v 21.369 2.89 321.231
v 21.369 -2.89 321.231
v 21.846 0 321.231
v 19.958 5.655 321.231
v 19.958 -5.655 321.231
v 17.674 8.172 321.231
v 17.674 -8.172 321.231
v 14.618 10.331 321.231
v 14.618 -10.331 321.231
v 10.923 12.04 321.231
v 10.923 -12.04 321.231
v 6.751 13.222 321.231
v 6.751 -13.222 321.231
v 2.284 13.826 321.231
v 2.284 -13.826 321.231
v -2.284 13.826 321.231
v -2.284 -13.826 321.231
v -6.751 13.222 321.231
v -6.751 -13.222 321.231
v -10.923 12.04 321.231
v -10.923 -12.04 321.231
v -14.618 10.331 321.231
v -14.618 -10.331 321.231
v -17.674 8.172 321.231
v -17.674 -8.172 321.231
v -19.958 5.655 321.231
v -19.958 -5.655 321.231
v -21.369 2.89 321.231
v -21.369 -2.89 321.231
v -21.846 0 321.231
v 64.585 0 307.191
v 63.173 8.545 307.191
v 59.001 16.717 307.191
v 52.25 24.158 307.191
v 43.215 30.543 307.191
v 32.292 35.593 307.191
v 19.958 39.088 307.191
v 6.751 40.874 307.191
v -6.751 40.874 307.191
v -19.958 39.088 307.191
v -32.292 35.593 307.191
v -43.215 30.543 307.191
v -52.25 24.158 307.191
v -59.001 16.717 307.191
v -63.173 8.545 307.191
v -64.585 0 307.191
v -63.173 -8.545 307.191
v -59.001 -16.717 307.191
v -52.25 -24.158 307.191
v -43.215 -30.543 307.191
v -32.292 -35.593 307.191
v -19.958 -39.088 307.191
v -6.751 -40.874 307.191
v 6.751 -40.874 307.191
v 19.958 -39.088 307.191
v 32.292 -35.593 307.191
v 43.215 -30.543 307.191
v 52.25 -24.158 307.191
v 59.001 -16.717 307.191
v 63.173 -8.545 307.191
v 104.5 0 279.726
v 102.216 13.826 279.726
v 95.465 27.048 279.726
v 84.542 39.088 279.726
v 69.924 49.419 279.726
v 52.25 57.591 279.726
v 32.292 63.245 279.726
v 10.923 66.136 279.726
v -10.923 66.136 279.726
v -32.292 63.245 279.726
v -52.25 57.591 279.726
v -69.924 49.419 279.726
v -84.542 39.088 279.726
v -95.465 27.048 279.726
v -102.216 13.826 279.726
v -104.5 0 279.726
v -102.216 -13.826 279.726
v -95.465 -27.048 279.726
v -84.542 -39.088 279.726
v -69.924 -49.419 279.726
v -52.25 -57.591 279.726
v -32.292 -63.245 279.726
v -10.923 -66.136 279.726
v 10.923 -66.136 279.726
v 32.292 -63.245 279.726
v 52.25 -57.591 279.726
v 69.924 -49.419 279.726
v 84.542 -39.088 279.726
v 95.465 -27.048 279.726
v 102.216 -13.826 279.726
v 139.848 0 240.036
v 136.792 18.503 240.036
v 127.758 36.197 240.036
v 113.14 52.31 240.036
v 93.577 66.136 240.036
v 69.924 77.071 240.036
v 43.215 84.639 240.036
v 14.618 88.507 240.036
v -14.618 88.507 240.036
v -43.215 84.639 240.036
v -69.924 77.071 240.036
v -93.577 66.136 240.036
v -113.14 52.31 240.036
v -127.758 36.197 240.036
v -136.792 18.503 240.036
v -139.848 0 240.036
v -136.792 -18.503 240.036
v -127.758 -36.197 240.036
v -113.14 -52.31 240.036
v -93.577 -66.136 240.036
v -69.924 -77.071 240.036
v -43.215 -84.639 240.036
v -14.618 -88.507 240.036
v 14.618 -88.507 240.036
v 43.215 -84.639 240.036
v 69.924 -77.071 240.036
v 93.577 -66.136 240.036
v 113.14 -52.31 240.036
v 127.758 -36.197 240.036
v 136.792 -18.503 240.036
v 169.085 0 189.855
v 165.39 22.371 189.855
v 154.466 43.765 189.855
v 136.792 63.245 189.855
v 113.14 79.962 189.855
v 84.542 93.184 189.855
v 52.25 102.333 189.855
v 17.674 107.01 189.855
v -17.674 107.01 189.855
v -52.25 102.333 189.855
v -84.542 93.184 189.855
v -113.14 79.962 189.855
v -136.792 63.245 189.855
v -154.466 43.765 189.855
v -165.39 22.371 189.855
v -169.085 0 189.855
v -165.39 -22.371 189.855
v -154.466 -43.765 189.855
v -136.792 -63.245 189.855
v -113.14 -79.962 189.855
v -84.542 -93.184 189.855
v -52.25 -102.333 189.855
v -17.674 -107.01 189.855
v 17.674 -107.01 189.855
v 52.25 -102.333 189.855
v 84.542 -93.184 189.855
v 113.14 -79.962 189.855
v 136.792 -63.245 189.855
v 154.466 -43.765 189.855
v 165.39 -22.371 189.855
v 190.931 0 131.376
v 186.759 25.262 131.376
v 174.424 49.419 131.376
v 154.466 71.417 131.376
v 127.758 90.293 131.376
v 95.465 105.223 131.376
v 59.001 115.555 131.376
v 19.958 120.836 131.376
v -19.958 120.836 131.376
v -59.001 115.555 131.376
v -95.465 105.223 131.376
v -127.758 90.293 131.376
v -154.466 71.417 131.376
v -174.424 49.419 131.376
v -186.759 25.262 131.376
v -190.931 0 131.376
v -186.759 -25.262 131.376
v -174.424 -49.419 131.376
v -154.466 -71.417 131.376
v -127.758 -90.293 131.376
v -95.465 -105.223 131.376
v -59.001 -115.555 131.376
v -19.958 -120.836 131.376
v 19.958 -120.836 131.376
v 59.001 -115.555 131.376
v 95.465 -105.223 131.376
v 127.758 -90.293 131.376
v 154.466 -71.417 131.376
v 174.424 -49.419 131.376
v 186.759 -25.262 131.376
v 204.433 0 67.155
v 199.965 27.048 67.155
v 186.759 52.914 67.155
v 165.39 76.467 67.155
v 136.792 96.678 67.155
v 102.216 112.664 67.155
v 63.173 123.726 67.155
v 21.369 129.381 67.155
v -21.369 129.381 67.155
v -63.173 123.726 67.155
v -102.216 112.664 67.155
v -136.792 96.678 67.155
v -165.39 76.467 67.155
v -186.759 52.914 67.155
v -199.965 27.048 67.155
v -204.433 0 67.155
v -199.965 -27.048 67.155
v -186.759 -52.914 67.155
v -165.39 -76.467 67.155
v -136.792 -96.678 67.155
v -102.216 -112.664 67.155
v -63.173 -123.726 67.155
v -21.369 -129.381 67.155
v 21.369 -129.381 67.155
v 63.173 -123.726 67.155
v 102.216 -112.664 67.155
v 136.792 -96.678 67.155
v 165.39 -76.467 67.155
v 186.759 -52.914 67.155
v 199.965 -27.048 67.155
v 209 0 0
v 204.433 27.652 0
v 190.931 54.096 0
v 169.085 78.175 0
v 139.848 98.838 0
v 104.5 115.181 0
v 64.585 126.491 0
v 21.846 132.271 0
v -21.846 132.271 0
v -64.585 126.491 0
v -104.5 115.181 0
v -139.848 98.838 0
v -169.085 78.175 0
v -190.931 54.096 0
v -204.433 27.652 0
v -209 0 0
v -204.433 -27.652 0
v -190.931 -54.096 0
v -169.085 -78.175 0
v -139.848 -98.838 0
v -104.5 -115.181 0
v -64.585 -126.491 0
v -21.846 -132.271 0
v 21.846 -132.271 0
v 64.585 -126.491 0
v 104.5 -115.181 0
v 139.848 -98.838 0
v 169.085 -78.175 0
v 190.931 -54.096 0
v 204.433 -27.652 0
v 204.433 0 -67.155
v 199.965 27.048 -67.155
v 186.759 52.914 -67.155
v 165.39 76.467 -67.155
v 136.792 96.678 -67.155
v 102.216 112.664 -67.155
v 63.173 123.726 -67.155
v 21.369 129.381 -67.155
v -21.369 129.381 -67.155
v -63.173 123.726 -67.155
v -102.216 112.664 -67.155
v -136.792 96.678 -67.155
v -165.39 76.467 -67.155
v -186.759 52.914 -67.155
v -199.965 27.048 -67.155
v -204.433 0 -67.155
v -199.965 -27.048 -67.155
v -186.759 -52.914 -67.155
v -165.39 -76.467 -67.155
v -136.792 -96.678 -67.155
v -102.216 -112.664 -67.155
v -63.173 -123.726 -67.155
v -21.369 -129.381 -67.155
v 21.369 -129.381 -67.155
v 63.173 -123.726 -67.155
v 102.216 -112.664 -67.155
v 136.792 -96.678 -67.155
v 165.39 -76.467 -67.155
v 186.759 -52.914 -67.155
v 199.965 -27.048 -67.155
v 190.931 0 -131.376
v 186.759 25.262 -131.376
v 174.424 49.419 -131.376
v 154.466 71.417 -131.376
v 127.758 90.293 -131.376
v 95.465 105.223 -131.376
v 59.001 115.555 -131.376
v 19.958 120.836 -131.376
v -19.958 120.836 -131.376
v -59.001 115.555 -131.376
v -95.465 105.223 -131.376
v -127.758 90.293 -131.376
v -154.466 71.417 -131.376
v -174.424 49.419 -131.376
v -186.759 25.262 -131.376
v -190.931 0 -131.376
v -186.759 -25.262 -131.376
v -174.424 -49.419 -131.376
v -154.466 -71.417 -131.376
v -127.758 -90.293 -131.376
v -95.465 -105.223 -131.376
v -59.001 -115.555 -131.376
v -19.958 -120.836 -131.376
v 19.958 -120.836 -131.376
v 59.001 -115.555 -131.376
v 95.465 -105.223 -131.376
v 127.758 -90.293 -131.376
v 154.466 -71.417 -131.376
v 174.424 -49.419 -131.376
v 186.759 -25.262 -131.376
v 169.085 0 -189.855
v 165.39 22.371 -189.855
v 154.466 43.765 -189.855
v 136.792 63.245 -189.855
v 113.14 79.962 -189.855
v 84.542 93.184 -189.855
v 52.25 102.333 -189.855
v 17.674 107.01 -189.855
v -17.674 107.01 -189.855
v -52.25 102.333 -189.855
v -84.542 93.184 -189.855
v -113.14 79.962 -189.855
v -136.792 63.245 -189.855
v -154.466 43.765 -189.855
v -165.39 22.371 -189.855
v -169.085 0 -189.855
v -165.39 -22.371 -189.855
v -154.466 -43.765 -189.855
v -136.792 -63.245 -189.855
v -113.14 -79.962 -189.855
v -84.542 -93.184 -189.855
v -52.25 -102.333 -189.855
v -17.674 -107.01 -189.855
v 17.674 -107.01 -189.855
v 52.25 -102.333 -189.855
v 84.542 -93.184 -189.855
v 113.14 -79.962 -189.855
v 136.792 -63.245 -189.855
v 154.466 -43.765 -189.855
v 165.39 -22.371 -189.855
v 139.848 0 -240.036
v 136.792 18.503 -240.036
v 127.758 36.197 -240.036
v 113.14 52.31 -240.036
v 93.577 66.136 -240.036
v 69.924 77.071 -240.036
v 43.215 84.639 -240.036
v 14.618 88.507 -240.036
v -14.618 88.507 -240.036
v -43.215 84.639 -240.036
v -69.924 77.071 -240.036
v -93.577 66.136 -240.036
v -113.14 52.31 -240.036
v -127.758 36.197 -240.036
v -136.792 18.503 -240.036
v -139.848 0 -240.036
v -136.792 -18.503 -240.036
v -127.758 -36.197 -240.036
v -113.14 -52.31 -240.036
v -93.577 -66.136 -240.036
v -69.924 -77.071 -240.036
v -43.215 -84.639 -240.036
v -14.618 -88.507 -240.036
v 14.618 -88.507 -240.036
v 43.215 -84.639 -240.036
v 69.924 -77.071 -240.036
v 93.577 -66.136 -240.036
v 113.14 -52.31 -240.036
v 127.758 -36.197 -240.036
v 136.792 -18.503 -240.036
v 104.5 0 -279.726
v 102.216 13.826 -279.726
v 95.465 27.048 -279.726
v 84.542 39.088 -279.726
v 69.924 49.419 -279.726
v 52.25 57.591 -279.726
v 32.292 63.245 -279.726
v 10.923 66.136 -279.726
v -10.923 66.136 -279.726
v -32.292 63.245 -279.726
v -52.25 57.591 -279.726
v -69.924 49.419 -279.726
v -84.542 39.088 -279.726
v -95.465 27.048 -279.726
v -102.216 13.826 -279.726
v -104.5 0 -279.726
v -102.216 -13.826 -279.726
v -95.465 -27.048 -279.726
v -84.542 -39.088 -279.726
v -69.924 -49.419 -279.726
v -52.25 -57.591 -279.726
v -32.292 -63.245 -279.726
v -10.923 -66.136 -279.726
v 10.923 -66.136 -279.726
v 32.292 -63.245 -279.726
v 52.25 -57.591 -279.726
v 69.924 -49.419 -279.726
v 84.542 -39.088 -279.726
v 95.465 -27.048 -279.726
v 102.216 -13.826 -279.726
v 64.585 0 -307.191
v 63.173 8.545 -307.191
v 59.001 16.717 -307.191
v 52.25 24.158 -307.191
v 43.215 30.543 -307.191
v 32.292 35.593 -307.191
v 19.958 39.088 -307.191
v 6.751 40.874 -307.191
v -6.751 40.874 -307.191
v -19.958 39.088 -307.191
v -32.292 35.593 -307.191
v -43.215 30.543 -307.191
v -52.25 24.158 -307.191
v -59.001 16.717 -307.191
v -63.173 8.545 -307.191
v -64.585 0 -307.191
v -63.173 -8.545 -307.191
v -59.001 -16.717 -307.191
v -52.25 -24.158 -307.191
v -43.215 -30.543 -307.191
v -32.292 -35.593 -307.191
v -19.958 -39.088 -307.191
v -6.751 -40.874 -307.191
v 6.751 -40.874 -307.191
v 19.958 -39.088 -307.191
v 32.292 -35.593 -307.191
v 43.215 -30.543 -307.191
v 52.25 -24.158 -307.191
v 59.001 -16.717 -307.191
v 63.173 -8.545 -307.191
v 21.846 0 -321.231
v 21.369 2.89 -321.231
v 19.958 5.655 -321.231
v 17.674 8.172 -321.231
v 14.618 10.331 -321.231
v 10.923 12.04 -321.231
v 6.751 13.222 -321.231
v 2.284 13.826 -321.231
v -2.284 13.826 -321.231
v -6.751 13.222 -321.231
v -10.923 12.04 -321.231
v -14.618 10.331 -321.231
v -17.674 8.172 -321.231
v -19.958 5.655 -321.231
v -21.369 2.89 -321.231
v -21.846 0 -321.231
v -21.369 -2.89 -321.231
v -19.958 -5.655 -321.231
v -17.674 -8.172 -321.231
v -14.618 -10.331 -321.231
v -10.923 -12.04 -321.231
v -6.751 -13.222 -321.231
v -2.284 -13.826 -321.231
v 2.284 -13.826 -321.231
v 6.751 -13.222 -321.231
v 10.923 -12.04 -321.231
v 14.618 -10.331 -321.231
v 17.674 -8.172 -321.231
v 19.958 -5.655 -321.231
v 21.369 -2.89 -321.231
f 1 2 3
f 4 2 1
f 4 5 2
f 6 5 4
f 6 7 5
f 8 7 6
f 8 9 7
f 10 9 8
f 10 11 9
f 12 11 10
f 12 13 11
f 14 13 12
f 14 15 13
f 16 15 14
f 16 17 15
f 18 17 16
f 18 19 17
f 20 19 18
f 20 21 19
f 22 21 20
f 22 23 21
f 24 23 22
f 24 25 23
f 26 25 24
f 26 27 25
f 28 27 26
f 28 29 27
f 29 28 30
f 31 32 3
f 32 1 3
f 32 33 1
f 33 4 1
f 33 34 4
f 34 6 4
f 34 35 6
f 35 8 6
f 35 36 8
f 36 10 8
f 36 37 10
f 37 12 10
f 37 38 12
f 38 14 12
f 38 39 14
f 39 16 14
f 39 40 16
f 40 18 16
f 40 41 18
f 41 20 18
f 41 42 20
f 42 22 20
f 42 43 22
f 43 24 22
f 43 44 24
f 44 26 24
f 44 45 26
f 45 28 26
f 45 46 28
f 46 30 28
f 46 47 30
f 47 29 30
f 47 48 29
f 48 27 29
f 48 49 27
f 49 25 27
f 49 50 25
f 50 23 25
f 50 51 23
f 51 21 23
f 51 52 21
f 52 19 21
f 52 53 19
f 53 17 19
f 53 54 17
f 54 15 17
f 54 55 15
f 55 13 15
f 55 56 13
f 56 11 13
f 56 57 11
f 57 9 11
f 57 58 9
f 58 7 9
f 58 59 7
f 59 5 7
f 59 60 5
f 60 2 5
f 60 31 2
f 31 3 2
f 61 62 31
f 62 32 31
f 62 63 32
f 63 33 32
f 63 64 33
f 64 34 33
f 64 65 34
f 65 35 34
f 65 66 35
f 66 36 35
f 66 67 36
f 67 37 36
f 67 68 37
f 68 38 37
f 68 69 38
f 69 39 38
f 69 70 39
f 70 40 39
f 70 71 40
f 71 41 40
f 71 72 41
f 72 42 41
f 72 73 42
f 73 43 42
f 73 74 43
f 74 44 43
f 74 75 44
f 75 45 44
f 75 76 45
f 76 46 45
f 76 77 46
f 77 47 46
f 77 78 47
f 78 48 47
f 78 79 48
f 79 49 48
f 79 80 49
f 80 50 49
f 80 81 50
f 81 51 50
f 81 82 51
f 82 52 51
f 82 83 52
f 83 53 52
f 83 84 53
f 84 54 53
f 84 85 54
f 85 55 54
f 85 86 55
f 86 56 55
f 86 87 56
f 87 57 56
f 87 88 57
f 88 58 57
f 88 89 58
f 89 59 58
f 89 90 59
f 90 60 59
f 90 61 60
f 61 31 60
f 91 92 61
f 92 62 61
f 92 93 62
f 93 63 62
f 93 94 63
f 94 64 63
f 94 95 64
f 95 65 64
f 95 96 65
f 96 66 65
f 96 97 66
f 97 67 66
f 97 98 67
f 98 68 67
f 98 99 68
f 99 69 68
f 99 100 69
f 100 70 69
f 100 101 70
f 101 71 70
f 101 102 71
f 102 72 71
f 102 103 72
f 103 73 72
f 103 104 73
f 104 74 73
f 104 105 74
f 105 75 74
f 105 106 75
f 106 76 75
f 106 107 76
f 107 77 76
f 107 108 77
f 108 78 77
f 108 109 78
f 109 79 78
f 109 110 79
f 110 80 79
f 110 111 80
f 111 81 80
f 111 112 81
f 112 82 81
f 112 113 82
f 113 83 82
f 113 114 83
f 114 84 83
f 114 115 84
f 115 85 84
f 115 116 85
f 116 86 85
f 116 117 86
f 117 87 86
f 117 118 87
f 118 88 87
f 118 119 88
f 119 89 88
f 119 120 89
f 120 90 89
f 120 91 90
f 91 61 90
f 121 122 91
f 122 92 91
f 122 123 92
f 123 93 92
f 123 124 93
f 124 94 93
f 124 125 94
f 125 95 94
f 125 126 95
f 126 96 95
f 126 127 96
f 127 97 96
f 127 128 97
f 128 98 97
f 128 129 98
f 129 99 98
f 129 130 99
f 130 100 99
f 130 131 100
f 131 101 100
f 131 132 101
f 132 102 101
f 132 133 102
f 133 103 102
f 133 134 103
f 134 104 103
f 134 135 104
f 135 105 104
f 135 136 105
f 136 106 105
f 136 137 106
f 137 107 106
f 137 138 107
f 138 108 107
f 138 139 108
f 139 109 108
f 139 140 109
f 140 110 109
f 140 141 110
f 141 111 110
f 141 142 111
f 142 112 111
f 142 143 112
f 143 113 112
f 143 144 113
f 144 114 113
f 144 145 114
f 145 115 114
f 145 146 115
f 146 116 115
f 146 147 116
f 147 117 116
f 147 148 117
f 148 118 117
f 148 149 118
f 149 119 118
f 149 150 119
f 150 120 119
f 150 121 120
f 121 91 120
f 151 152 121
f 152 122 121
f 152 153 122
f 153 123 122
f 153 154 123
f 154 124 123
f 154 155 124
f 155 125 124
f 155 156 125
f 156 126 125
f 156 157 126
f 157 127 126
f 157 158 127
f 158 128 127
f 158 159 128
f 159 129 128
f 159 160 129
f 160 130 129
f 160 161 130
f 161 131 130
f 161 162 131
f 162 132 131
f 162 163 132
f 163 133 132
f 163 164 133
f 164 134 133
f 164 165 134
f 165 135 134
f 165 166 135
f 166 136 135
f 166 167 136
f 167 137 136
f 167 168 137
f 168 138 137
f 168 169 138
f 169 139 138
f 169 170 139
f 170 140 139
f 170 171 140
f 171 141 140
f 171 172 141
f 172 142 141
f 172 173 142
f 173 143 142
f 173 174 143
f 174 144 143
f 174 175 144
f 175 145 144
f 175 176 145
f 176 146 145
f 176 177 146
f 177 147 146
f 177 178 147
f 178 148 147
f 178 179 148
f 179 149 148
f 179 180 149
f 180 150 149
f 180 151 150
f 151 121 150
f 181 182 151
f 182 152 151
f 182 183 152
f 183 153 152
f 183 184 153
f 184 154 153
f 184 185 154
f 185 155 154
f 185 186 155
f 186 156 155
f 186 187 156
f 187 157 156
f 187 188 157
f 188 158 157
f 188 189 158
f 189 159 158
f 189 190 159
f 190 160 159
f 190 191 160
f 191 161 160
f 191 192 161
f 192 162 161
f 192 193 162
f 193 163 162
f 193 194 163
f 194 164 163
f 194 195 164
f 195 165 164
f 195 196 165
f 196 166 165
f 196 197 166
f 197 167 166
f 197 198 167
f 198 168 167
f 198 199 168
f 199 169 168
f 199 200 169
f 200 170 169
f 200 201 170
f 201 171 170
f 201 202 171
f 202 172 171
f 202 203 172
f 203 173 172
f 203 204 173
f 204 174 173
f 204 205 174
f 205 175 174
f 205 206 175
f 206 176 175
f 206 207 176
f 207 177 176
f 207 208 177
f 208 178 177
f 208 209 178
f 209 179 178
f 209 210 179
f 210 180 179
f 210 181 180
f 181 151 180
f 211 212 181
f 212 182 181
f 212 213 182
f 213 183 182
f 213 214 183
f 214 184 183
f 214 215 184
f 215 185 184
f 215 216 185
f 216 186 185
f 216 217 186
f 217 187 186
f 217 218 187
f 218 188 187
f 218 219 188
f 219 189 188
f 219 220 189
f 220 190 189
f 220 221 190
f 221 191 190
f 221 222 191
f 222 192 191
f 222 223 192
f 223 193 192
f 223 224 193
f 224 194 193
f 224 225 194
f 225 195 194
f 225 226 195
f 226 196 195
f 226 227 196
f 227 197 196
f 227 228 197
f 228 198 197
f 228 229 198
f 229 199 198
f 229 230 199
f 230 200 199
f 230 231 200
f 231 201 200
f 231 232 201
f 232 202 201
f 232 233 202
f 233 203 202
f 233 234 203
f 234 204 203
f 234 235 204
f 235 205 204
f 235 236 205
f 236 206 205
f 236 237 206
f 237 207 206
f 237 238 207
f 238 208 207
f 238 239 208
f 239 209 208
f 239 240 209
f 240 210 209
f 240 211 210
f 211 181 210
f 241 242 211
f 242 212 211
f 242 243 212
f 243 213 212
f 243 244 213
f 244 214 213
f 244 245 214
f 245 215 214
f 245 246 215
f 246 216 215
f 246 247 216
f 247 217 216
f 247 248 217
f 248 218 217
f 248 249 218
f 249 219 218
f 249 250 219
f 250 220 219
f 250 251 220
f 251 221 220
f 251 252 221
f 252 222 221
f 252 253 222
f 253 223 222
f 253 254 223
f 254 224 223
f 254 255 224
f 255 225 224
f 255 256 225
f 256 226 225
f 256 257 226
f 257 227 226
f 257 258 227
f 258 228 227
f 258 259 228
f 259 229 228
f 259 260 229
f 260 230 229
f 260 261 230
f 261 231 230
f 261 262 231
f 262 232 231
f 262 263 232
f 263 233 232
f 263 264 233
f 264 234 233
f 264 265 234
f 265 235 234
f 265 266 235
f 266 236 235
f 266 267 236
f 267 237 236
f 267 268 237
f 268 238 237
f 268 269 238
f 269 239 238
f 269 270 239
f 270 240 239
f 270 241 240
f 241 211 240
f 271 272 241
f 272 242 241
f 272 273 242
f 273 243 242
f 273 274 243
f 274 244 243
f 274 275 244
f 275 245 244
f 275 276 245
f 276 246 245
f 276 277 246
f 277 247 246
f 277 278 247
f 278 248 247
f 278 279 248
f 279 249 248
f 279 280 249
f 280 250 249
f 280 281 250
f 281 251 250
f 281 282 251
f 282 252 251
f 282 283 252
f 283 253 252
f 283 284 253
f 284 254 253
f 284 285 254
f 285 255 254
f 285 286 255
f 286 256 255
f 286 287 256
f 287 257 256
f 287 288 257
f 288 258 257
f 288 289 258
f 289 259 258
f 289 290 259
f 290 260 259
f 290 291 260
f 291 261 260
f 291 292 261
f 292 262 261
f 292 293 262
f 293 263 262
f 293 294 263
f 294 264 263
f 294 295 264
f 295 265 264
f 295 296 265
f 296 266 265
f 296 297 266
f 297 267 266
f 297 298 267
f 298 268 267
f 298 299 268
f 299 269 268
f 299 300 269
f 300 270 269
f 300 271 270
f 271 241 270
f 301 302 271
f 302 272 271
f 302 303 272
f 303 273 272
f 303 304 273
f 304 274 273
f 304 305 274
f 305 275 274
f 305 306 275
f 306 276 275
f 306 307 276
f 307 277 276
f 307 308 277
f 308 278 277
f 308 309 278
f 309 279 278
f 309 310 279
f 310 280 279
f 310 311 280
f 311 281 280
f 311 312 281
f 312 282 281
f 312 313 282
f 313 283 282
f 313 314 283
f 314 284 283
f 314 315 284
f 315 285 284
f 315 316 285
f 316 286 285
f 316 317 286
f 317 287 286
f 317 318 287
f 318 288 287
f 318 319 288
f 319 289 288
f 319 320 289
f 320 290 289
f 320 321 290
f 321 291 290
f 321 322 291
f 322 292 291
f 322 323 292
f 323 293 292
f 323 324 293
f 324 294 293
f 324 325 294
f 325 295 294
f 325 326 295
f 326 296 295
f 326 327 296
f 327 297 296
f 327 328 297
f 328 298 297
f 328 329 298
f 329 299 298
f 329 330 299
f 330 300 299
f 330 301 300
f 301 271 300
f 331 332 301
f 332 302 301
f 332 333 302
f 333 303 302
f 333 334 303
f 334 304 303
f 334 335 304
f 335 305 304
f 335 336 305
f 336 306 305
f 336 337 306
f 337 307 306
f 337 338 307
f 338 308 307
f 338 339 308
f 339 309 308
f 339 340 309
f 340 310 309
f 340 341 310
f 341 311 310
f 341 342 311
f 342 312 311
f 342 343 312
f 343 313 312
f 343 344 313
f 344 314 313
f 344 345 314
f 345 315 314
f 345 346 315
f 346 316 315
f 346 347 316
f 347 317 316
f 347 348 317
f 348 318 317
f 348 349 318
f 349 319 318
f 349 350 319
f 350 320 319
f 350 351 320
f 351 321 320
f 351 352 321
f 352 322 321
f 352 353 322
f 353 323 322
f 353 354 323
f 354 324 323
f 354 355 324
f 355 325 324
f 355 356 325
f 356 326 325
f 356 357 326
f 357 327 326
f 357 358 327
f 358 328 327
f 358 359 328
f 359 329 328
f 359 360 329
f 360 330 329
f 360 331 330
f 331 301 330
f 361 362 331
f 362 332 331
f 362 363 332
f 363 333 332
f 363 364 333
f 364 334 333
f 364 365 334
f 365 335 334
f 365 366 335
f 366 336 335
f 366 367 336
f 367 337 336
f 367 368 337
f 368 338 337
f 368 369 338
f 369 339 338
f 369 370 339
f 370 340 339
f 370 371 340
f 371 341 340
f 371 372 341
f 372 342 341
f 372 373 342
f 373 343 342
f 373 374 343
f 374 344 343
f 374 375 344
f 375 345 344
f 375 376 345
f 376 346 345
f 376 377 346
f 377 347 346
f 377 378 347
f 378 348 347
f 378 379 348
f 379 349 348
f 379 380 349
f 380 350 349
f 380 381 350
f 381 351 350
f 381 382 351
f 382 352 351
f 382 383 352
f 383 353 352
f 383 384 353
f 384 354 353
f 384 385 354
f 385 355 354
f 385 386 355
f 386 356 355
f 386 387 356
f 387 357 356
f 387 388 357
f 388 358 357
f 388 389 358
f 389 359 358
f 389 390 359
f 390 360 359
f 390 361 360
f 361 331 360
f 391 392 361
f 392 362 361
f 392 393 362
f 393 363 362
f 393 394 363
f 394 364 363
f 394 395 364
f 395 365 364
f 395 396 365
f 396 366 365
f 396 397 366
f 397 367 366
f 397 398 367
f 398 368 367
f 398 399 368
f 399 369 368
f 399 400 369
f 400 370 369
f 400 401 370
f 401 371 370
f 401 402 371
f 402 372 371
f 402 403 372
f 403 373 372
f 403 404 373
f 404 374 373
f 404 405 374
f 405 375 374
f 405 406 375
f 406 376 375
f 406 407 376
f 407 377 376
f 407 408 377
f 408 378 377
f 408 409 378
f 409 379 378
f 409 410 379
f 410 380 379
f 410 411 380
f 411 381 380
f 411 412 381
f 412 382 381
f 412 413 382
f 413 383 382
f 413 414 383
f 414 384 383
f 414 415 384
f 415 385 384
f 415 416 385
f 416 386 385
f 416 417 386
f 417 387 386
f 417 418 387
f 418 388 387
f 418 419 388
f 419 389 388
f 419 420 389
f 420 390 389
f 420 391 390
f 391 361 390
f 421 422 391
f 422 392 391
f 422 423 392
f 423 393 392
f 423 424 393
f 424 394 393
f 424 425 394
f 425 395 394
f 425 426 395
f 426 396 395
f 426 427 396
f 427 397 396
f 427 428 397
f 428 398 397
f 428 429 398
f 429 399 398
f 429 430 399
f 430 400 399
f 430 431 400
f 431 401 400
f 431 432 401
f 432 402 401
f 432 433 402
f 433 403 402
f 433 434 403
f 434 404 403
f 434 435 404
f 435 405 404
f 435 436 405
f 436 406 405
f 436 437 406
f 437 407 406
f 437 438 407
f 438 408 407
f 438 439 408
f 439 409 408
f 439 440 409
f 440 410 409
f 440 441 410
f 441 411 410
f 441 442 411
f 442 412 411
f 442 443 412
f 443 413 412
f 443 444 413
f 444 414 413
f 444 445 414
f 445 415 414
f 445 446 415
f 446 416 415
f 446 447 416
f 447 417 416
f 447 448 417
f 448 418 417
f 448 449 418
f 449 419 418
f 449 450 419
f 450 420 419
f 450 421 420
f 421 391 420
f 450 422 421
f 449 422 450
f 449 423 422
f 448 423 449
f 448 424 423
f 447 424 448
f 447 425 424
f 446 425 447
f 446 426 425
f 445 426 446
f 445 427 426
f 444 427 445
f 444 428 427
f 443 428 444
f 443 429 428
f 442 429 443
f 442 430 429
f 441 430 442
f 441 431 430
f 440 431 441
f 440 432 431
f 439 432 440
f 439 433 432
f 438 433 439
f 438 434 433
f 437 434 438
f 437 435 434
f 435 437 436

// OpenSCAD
// Generated by SolidPython 1.0.1 on 2020-07-29 00:46:49


scale(v = [11, 7, 17]) {
	sphere(r = 19);
}
/***********************************************
*********      SolidPython code:      **********
************************************************
 
# import packages: SolidPython
from solid import *
from solid.utils import *
from itertools import chain, combinations, permutations


class Resize:

    def __init__(self, scad_file):
        self.scad_file = scad_file
        #self.scad_file = import_scad(scad_file)
        # cone/cylinder param:
        self.r1 = 0
        self.r2 = 0
        self.h = 0
        # rectangular prism param:
        self.w = 0
        self.l = 0
        # ellipse param:
        self.r = 0

    # import OpenScad code (file name corresponds to shape)


    # classify shape + parameters
    def assign(self, param1, param2, param3):
        if self.scad_file == 'cone.scad':
            self.r1 = param1
            self.r2 = param2
            self.h = param3
        elif self.scad_file == 'cylinder.scad':
            self.r1 = param1
            self.r2 = param2
            self.h = param3
        elif self.scad_file == 'rectangularPrism.scad':
            self.h = param1
            self.l = param2
            self.w = param3
        else:
            self.r = param1
            self.h = param2

    # resize parameters
    def iterate(self):
        x = range(3, 20, 2)
        i = 1
        if self.scad_file == 'cone.scad':
            tempList = list(permutations(x, 2))
            for temp in tempList:
                param1 = temp[0]
                param2 = temp[1]
                filepath = 'produced_scad_files/' + 'cone' + str(param1) + '_' + str(param2) + '_' + '.scad'
                scad_render_to_file(cylinder(h=param1, r1=param2, r2=0), filepath)

        elif self.scad_file == 'cylinder.scad':
            tempList = list(permutations(x, 3))
            for temp in tempList:
                param1 = temp[0]
                param2 = temp[1]
                filepath = 'produced_scad_files/' + 'cylinder' + str(param1) + '_' + str(param2) + '_' + '.scad'
                scad_render_to_file(cylinder(h=param1, r1=param2, r2=param2), filepath)

        elif self.scad_file == 'rectangularPrism.scad':
            tempList = list(permutations(x, 3))
            for temp in tempList:
                param1 = temp[0]
                param2 = temp[1]
                param3 = temp[2]
                filepath = 'produced_scad_files/' + 'rectangularPrism' + str(param1) + '_' + str(param2) + '_' + str(
                    param3) + '.scad'
                scad_render_to_file(cube(size=(param1, param2, param3)), filepath)

        elif self.scad_file == 'ellipse.scad':
            tempList = list(permutations(x, 4))
            for temp in tempList:
                param1 = temp[0]
                param2 = temp[1]
                param3 = temp[2]
                param4 = temp[3]
                filepath = 'produced_scad_files/' + 'ellipse' + str(param1) + '_' + str(param2) + '_' + str(param3) + '_' + str(param4) + '.scad'
                scad_render_to_file(scale([param1, param2, param3])(sphere(r=param4)), filepath)

    def render_to_scadfile(self):
        scad_render_to_file(scad, 'example.scad') 
 
************************************************/
